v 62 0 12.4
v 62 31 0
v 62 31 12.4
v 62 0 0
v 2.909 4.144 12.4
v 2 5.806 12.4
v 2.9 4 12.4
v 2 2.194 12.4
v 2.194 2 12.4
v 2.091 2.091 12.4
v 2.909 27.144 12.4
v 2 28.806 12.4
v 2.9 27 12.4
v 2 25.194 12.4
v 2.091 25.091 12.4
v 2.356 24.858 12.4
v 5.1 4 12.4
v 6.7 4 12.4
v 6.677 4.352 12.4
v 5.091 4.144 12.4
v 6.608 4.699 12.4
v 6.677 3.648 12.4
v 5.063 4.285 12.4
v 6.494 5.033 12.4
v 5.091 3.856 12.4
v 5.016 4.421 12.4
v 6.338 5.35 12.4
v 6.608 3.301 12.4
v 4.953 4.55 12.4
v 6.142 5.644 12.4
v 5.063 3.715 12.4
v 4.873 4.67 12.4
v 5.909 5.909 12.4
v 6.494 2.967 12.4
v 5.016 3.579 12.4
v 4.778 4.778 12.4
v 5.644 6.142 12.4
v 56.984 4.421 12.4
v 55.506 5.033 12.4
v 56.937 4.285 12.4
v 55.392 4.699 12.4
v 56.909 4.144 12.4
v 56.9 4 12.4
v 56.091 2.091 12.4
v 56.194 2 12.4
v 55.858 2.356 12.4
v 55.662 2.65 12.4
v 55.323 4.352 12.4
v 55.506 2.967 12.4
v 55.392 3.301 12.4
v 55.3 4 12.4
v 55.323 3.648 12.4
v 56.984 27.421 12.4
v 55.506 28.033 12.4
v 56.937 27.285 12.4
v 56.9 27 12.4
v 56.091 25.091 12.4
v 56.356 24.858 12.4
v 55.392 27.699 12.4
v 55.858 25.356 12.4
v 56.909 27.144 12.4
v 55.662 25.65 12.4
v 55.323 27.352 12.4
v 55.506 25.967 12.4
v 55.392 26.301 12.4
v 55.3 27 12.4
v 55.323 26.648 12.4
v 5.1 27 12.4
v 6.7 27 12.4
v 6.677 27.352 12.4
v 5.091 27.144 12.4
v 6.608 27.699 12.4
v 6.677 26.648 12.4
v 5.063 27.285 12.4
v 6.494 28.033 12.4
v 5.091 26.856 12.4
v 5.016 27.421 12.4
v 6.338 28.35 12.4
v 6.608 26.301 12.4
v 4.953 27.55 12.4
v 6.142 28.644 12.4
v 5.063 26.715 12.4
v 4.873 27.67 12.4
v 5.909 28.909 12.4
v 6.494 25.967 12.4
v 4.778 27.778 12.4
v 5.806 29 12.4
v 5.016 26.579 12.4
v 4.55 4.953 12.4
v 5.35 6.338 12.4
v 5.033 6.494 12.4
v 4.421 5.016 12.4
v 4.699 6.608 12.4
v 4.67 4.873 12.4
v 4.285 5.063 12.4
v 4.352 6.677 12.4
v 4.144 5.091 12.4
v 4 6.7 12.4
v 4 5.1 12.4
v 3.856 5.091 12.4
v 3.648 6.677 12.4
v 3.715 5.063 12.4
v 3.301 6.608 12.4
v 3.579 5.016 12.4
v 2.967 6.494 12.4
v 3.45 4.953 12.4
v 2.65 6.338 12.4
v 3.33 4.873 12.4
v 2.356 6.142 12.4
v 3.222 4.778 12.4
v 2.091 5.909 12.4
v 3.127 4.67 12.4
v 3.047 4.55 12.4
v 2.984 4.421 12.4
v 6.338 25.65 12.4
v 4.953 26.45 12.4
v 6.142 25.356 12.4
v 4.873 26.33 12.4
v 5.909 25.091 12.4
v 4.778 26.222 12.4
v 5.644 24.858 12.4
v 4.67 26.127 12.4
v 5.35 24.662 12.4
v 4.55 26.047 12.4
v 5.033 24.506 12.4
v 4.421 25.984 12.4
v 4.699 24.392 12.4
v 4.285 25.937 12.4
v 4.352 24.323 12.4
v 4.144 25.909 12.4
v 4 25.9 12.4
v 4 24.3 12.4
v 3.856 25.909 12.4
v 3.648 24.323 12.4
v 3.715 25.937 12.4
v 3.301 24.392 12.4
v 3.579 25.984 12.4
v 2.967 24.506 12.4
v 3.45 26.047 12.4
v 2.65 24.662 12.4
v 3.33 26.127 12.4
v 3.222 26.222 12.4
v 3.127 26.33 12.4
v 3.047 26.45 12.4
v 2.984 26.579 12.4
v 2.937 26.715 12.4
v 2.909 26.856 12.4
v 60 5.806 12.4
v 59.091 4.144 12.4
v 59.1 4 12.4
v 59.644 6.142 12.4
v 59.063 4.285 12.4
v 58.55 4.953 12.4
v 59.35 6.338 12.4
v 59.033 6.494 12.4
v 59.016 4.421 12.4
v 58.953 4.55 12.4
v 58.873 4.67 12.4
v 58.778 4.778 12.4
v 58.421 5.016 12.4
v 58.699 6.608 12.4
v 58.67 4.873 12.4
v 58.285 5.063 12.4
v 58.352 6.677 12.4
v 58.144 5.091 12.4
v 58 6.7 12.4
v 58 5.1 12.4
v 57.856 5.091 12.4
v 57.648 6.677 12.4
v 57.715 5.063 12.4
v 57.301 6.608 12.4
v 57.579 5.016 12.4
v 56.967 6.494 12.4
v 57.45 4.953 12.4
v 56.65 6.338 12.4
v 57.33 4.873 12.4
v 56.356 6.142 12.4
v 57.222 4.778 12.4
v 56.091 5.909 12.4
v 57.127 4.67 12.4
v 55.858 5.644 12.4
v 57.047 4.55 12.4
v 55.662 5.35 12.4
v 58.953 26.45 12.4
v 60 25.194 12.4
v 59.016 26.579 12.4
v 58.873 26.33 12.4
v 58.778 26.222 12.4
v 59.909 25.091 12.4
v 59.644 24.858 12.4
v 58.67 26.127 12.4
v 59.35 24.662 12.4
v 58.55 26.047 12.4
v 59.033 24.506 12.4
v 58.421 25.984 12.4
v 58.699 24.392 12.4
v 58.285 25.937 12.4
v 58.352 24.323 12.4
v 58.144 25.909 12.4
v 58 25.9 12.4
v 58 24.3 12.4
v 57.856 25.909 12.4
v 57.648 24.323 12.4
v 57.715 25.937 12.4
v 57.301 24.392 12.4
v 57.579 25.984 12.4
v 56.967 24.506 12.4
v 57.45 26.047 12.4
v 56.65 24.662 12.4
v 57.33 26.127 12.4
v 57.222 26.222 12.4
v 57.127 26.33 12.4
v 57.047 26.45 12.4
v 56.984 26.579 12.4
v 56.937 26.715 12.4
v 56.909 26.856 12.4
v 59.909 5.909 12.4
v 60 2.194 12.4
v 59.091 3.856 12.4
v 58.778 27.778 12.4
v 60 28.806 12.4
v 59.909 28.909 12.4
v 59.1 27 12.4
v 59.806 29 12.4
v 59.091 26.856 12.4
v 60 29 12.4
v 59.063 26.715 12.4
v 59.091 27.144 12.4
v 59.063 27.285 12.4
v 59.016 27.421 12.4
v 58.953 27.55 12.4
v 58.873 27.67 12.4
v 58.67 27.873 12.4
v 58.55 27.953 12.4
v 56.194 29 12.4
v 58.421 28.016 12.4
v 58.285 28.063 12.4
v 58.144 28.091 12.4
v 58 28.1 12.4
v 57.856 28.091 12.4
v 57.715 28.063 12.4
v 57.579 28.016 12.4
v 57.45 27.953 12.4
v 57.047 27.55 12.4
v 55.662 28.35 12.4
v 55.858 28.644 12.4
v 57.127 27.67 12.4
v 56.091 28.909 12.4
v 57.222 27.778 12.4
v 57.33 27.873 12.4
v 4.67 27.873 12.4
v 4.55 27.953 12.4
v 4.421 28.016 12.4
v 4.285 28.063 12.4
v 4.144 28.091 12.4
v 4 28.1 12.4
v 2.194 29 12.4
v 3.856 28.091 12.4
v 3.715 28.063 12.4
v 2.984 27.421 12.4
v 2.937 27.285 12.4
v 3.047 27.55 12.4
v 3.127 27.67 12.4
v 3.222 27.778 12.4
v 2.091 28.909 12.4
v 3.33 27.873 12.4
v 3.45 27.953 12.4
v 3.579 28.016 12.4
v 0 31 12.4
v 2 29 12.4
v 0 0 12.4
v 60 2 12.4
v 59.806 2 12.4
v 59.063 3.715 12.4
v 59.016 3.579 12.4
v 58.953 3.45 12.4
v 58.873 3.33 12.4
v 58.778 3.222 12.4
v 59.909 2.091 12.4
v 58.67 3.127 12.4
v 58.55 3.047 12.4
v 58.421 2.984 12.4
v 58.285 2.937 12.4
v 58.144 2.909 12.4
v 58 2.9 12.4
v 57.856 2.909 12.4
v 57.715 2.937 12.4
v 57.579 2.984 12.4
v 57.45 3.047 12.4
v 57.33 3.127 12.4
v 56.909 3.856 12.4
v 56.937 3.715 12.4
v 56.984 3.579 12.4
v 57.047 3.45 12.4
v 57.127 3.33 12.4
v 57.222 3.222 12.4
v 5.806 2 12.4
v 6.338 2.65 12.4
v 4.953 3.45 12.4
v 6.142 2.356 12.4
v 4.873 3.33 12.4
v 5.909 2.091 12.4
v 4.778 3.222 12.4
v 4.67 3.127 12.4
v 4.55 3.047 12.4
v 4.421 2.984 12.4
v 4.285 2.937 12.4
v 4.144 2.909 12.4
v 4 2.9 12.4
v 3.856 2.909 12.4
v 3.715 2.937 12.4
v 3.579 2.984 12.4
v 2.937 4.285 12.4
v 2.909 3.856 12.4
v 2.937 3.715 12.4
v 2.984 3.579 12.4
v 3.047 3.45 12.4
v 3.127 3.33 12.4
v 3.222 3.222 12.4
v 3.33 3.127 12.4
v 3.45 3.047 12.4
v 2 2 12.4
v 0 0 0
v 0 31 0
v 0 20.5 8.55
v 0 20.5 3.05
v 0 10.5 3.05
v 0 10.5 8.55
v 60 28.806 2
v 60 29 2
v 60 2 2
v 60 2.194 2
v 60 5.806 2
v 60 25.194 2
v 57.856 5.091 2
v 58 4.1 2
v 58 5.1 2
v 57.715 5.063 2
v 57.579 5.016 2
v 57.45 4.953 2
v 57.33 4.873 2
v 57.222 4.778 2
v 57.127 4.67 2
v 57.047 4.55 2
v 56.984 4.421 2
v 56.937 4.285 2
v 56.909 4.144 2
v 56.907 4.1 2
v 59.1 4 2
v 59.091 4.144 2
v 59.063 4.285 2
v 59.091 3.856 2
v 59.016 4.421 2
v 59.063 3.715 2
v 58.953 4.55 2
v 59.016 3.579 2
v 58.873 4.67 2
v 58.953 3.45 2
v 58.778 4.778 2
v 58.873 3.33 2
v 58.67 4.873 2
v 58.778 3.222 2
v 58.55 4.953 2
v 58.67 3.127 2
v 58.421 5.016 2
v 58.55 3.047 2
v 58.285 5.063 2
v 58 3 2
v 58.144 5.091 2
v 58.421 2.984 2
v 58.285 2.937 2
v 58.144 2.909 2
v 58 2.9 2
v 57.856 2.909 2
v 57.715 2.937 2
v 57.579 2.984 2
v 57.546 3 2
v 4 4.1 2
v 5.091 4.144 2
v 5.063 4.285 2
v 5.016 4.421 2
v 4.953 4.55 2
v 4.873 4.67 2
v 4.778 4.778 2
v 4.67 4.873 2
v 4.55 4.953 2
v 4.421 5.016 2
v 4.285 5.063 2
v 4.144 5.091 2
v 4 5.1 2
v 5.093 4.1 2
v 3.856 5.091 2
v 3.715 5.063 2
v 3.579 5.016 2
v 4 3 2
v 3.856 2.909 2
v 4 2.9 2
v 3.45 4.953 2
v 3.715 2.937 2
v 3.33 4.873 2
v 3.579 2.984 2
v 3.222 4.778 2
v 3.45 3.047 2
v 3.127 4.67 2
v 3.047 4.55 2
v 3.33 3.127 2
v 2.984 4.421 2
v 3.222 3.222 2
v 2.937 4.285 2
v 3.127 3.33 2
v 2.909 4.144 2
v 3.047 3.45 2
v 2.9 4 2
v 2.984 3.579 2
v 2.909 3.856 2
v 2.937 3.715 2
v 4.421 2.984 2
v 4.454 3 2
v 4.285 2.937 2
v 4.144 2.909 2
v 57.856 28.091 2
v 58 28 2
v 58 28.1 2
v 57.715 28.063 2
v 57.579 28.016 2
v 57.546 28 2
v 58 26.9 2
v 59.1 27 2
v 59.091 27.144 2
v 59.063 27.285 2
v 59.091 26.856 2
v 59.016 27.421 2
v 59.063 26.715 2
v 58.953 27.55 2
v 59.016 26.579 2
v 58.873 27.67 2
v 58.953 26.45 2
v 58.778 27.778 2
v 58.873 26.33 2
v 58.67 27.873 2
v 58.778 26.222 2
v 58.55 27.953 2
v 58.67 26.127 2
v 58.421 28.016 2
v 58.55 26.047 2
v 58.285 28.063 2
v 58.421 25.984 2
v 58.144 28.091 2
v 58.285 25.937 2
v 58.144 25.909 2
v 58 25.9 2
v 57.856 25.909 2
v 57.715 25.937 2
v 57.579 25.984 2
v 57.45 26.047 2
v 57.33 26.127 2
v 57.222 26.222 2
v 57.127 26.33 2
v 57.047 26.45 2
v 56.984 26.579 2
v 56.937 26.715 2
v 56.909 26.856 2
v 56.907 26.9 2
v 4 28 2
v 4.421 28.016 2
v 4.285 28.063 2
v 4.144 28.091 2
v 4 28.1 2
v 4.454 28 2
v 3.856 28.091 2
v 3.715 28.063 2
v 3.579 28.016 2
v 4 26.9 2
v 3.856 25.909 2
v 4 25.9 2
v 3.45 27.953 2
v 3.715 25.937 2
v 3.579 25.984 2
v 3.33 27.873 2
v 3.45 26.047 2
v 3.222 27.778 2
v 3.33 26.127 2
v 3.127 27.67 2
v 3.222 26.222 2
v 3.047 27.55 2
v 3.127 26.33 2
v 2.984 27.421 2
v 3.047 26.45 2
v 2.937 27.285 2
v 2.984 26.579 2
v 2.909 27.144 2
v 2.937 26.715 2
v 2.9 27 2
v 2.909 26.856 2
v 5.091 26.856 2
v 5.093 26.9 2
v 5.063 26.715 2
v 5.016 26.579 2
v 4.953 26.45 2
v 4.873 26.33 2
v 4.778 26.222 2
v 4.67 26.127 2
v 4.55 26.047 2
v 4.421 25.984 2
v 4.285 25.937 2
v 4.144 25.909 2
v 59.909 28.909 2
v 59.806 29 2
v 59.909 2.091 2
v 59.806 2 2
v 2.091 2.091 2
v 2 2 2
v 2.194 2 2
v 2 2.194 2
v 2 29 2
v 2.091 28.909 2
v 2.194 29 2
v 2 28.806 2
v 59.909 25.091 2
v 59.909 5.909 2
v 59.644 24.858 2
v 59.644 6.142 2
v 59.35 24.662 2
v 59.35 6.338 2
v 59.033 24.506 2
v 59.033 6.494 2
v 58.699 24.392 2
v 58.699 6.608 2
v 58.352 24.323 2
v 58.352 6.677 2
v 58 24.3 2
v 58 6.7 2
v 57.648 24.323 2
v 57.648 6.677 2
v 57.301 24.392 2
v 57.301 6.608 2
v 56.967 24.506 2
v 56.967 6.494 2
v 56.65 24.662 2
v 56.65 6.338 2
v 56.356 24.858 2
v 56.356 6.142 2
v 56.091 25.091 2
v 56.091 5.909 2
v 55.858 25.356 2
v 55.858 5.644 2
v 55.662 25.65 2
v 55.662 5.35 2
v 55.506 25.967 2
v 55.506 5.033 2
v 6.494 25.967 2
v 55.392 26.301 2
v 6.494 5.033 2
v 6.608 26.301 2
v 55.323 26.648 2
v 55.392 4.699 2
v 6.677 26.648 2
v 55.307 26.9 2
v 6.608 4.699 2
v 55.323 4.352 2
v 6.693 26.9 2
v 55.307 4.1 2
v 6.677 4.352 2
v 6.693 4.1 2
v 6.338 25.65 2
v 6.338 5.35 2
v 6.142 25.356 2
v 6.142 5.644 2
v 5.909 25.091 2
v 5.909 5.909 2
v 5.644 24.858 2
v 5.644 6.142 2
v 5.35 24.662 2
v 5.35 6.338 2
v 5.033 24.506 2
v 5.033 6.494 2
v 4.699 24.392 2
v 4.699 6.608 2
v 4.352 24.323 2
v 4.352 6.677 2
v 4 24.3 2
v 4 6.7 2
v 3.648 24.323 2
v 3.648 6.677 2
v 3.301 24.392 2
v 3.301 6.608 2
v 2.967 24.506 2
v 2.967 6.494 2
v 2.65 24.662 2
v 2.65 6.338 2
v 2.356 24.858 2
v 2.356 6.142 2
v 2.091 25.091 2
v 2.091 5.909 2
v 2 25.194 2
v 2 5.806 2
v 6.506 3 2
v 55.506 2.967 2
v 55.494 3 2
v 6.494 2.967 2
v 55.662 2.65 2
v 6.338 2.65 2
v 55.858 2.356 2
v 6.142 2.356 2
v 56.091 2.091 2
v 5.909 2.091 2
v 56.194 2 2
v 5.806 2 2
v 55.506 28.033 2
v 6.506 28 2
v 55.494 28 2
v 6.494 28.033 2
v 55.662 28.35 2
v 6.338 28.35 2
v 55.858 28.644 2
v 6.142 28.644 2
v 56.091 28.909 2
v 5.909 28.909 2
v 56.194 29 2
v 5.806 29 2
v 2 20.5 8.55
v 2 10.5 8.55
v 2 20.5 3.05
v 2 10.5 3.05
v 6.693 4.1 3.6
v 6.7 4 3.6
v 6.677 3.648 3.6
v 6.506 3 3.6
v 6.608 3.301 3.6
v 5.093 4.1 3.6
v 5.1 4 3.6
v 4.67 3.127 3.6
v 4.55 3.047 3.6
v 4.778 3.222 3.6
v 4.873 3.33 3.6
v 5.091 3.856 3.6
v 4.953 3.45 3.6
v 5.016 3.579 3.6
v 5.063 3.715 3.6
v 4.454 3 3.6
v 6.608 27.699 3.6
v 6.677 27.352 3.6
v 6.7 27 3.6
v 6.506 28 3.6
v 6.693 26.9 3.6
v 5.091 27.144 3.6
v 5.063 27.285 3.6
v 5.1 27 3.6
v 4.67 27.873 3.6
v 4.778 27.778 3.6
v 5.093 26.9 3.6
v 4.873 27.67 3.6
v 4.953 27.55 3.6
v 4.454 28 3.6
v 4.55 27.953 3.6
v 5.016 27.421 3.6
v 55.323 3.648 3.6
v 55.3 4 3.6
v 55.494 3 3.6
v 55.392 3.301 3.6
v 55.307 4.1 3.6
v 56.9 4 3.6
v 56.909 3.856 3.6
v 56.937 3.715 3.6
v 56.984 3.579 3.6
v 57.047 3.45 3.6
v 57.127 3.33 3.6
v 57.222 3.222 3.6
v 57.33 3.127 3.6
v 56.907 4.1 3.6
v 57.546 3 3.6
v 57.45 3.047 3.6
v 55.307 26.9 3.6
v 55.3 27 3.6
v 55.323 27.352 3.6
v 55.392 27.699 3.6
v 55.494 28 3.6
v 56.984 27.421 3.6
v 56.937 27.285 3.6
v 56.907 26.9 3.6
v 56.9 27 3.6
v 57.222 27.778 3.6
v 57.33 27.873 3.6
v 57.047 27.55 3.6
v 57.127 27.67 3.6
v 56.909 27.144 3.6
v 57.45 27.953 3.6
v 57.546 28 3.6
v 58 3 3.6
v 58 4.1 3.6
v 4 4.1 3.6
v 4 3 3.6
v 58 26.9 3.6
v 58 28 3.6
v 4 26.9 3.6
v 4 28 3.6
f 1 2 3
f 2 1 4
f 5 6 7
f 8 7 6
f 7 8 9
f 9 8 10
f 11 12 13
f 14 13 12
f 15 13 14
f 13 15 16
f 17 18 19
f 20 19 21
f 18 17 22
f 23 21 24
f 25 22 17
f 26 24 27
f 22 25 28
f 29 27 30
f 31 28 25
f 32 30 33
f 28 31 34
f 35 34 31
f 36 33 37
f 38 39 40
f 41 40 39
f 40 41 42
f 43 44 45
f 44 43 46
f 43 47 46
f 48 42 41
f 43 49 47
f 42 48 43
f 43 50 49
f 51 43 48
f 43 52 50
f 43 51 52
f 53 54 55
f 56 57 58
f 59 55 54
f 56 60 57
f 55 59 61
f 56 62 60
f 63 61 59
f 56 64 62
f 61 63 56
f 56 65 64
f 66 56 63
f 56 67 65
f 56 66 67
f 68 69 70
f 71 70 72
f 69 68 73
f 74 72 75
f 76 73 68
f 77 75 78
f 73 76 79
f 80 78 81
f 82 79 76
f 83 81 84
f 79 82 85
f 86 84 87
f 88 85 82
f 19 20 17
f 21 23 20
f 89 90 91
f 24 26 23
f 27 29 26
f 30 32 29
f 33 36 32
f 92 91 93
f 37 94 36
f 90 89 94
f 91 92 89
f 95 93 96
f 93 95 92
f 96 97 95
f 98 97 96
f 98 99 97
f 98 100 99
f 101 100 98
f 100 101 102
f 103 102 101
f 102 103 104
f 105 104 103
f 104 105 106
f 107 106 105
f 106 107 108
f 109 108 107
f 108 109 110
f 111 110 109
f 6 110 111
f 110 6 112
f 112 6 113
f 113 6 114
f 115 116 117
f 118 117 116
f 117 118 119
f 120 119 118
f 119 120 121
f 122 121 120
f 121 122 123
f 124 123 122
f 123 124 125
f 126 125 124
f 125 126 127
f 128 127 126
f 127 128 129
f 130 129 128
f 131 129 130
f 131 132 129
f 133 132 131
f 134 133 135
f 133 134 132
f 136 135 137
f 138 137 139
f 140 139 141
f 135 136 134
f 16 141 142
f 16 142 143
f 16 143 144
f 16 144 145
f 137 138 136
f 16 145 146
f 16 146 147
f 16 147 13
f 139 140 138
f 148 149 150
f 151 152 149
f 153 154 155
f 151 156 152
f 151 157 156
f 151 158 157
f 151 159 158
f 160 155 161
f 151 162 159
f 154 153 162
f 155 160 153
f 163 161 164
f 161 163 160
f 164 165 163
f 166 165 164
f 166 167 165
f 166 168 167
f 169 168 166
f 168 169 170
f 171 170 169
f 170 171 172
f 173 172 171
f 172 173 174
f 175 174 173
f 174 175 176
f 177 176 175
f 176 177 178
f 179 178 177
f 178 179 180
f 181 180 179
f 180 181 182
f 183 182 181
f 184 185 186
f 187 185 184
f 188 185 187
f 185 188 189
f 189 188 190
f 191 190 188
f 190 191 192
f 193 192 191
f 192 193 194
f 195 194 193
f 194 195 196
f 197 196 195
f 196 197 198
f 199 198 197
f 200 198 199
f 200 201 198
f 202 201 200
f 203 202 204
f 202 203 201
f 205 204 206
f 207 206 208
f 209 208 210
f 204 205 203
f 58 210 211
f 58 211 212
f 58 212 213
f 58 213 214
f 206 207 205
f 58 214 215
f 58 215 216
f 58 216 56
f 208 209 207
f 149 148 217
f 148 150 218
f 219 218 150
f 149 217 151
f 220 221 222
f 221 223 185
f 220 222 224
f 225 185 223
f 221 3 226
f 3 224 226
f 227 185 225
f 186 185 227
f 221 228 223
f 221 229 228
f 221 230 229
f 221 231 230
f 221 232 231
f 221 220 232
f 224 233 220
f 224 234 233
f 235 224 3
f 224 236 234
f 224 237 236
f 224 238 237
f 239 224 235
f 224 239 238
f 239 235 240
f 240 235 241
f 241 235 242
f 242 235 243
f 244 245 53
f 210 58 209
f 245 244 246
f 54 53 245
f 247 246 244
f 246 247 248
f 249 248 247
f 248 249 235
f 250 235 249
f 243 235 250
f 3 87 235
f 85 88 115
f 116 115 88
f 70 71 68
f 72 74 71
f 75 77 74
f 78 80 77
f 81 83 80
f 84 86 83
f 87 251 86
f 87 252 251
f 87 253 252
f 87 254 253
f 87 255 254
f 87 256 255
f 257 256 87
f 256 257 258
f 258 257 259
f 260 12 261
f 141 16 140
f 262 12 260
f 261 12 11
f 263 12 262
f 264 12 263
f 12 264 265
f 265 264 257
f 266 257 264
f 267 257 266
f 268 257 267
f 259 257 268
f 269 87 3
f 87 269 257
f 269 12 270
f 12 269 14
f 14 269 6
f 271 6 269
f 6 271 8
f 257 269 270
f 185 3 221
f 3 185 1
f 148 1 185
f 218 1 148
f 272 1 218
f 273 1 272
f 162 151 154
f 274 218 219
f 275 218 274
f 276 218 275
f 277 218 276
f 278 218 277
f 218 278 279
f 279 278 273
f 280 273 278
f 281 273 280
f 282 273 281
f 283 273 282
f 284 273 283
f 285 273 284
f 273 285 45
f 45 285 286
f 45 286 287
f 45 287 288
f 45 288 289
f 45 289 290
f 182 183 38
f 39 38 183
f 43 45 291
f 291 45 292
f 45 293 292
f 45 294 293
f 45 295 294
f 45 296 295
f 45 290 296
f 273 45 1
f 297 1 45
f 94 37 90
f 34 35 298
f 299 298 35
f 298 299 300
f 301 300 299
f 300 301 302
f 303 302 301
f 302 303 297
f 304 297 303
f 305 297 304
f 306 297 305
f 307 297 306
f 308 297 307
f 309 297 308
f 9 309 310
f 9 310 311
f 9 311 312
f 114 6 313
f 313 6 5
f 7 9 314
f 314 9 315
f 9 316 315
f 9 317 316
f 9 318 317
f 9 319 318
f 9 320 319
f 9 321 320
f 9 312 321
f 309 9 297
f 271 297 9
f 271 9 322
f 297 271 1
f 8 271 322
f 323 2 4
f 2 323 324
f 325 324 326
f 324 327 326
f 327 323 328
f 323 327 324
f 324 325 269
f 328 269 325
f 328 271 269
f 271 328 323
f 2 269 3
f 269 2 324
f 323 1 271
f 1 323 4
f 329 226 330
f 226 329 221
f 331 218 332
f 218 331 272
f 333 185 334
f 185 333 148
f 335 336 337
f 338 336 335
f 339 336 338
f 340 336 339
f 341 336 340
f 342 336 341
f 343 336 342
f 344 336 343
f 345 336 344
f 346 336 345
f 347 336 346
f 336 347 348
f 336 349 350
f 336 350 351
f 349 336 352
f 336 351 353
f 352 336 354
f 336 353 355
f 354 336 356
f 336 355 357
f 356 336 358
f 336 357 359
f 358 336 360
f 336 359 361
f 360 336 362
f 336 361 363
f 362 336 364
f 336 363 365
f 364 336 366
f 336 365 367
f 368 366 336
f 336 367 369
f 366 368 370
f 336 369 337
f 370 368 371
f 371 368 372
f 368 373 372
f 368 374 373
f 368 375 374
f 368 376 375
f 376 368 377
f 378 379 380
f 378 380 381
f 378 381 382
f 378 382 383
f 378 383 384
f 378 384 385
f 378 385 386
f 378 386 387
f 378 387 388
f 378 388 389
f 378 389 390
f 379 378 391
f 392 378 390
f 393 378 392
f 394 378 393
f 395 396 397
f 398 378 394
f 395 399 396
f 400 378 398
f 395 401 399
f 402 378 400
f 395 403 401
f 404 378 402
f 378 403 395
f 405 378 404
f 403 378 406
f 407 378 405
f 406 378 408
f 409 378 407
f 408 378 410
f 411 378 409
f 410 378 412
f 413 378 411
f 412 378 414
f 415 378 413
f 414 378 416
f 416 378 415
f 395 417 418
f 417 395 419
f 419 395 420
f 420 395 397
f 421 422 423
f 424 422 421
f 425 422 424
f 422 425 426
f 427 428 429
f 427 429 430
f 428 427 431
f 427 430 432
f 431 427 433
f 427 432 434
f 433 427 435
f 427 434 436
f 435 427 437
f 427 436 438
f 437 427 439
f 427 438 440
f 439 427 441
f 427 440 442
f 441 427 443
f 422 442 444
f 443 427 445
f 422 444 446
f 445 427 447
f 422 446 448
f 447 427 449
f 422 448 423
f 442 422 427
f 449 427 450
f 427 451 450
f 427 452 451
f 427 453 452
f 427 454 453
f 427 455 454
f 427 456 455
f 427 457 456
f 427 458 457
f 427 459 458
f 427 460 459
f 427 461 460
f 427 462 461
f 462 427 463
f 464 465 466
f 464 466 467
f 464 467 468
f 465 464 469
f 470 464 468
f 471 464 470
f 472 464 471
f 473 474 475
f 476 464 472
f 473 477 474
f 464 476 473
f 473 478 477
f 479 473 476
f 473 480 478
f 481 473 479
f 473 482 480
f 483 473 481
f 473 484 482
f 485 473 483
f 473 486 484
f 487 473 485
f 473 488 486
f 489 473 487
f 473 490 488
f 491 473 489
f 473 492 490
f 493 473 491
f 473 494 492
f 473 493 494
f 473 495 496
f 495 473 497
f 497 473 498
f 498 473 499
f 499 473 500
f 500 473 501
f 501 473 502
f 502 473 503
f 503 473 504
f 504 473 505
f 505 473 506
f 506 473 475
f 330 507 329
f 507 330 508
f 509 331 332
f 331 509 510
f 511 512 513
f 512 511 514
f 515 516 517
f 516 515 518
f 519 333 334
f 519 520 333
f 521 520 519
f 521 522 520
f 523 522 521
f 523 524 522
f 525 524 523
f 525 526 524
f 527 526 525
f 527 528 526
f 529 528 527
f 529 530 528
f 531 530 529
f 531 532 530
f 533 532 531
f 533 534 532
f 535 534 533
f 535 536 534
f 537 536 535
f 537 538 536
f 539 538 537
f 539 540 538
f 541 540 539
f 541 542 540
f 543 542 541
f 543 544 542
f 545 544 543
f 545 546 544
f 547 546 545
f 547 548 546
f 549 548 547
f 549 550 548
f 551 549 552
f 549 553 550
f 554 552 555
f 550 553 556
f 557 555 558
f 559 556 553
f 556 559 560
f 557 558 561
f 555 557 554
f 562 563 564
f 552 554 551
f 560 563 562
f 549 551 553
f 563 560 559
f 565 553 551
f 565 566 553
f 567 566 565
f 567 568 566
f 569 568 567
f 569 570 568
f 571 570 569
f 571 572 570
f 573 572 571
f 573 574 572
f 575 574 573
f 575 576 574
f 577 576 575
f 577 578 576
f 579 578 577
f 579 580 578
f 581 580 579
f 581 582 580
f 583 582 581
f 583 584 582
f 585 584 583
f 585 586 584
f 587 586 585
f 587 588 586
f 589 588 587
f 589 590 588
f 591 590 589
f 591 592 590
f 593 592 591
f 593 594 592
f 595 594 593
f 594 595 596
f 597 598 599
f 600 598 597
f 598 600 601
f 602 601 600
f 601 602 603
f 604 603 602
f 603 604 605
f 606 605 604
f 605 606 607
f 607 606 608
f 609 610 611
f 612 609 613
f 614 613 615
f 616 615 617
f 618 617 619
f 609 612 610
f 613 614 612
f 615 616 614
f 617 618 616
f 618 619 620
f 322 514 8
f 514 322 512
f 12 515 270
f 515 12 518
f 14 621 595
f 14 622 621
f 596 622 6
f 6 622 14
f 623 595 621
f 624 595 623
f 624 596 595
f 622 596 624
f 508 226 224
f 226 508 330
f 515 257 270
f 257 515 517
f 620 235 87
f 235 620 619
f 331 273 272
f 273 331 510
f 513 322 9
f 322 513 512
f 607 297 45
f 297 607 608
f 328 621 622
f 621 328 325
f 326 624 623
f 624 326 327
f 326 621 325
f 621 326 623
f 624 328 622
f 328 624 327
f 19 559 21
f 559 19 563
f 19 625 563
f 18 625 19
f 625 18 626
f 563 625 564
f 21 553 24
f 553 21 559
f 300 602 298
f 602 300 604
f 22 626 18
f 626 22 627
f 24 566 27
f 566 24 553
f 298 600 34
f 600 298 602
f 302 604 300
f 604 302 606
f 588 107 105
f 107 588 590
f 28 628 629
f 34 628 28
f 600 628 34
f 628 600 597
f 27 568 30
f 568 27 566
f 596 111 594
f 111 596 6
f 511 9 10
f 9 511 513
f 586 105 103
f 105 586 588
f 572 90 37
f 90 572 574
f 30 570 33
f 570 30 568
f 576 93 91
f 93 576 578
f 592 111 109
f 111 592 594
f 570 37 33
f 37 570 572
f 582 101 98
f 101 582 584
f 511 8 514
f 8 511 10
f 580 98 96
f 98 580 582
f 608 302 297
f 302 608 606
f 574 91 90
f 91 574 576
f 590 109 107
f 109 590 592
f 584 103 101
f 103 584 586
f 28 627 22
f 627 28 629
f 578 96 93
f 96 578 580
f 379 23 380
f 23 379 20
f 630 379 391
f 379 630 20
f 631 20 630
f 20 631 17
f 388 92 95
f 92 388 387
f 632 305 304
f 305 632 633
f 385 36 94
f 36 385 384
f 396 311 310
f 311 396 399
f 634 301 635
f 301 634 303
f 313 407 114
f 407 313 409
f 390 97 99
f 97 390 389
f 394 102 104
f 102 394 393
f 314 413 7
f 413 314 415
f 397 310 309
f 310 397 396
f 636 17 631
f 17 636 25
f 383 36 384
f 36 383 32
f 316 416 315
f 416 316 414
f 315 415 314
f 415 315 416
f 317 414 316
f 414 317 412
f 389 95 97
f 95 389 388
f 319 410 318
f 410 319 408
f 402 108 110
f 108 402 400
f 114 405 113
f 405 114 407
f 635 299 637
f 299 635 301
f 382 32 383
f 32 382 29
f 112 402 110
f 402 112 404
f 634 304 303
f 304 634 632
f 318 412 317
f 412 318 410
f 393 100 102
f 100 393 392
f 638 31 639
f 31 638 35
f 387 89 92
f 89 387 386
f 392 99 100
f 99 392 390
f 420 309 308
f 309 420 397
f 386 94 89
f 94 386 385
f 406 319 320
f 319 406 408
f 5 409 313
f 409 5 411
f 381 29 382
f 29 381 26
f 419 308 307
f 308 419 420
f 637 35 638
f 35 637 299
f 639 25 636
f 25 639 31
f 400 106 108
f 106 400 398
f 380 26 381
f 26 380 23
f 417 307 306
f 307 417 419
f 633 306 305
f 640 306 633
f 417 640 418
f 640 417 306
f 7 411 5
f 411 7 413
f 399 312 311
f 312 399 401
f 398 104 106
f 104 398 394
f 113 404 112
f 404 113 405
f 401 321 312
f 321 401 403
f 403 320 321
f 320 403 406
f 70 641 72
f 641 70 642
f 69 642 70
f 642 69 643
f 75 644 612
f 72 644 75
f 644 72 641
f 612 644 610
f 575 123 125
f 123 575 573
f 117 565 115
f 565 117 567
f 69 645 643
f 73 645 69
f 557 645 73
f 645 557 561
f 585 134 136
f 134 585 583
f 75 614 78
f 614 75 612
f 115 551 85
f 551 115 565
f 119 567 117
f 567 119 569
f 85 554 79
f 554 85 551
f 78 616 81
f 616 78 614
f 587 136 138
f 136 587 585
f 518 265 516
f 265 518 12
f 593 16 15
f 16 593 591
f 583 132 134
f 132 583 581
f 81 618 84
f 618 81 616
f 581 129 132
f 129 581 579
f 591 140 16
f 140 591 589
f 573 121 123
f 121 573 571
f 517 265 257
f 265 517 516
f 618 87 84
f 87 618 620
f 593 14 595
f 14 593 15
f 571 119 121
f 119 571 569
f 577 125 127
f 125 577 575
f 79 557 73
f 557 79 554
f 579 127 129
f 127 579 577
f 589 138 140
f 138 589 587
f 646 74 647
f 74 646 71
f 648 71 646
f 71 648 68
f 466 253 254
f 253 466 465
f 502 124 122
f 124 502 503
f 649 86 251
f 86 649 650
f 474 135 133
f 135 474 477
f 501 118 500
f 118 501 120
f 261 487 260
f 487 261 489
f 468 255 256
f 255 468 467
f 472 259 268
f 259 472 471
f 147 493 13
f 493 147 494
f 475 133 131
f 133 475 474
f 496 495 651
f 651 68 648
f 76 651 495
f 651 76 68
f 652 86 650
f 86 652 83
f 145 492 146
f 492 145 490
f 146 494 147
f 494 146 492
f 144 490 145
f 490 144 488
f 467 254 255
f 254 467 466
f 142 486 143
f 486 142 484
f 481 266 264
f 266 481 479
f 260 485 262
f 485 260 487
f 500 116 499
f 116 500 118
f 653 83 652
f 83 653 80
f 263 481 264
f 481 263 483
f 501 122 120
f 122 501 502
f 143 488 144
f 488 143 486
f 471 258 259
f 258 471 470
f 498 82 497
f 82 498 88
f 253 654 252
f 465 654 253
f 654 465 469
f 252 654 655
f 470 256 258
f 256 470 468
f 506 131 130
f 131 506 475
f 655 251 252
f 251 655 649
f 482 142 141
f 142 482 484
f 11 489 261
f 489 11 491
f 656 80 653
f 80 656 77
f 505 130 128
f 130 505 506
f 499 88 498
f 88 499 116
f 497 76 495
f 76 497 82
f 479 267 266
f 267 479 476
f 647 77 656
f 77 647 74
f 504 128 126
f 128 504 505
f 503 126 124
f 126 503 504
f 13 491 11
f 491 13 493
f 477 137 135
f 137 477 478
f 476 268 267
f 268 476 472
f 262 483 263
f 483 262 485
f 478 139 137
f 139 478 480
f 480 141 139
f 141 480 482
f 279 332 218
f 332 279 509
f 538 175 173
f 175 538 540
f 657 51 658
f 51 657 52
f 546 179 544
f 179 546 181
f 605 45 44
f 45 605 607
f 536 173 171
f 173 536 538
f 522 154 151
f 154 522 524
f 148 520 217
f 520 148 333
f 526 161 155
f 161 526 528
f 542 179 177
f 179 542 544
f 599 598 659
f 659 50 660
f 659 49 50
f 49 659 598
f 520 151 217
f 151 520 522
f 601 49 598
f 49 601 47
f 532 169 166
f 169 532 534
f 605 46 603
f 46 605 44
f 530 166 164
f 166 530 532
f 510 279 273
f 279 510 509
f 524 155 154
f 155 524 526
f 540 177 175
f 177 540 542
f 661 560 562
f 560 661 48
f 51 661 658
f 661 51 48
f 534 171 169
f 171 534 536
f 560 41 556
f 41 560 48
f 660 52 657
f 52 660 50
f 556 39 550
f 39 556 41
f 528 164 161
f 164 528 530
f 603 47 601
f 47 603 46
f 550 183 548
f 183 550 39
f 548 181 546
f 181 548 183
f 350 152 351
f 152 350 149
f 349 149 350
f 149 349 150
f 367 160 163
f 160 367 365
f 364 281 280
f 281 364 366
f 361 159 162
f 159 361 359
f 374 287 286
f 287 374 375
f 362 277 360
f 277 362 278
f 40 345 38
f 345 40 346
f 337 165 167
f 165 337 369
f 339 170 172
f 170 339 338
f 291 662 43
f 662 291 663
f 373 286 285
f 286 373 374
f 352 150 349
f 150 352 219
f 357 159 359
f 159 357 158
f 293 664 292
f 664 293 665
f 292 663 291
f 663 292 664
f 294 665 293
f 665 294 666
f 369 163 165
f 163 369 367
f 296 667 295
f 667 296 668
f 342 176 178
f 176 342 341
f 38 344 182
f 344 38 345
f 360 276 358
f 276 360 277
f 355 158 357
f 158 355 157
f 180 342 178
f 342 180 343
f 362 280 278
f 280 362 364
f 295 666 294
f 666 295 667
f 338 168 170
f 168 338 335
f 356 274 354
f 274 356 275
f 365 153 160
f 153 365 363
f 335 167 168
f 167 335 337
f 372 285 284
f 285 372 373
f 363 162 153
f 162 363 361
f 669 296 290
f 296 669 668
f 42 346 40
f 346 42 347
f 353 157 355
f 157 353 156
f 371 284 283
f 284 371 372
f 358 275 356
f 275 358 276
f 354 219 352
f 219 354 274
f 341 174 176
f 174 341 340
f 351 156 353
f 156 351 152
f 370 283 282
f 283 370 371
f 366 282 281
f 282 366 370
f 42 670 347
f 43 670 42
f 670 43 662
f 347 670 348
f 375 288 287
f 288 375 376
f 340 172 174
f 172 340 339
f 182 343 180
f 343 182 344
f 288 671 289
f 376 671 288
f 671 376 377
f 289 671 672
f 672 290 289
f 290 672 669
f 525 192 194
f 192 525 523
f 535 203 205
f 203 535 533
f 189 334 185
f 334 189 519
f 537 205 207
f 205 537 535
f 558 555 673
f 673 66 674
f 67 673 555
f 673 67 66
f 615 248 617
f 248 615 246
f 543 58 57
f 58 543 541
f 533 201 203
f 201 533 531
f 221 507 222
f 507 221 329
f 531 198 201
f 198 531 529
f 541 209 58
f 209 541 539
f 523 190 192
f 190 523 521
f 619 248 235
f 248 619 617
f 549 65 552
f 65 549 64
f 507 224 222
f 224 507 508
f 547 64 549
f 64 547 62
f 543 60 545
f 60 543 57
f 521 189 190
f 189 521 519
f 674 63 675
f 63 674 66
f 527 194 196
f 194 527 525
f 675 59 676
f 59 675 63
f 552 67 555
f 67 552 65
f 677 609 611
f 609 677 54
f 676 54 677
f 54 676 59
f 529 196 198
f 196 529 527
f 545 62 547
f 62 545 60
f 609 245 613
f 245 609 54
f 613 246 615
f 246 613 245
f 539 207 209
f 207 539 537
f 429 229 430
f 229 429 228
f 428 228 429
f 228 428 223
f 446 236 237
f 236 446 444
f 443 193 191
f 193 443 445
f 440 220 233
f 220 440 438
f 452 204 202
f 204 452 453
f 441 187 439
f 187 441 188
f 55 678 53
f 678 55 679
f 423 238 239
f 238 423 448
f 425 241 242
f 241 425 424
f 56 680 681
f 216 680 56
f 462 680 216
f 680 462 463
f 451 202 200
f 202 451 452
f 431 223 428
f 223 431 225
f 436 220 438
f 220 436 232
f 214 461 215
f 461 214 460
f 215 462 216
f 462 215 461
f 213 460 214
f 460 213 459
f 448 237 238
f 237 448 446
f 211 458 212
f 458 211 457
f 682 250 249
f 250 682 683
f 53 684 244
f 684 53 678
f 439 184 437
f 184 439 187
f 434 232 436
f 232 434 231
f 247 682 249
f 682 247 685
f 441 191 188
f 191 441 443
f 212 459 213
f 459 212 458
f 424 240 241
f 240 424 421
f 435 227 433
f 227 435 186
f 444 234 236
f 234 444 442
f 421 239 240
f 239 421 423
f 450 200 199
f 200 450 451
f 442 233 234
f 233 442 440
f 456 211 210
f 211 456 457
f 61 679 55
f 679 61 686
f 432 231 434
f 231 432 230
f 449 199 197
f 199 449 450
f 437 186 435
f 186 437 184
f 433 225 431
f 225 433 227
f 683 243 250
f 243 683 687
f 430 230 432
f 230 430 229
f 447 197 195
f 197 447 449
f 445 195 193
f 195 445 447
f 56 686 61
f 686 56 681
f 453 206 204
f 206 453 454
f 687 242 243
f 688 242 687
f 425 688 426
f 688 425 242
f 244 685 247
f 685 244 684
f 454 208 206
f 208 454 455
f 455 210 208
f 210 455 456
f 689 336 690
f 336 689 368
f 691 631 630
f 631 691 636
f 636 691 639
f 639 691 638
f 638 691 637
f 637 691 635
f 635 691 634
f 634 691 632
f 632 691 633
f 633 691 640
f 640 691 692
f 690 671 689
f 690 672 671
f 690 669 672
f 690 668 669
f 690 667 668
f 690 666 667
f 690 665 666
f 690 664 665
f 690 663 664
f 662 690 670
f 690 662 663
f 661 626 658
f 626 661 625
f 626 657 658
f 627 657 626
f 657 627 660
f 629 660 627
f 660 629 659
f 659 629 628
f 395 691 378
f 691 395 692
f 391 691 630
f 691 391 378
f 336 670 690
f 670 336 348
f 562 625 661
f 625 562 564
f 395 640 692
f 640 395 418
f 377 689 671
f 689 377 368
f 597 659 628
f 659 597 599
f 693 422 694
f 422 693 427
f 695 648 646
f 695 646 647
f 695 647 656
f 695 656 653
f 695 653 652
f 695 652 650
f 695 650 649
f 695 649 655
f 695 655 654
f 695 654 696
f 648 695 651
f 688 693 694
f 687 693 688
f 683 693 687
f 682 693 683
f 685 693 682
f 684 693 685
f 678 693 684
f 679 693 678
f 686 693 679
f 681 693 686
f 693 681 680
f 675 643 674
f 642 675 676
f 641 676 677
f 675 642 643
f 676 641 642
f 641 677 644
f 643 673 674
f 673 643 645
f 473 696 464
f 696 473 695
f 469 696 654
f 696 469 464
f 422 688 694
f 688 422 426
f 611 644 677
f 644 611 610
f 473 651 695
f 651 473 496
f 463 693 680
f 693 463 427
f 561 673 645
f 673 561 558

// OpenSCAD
// PanicStick enclosure for Raspberry Pi Pico 2 (non-W). All dimensions are mm.
// Set part to "base" or "lid"; render (F6), then File > Export > Export as STL.
part = "base";
$fn = 48;

case_x=62; case_y=31; base_z=12.4; wall=2; floor=2; lid_z=2;
usb_width=10; usb_height=5.5; usb_y=case_y/2; usb_z=5.8;
button_x=39; button_y=case_y/2; button_aperture=9;
led_x=49.5; led_y=case_y/2; led_d=3.4;
screw_x=[4,58]; screw_y=[4,27];

module boss(x,y) {
  translate([x,y,floor]) difference() {
    cylinder(h=base_z-floor,d=5.4);
    translate([0,0,-0.1]) cylinder(h=base_z-floor+0.2,d=2.2);
  }
}
module base() {
  union() {
    difference() {
      cube([case_x,case_y,base_z]);
      translate([wall,wall,floor]) cube([case_x-2*wall,case_y-2*wall,base_z-floor+0.1]);
      // Pico 2 Micro-USB-B connector clearance.
      translate([-0.1,usb_y-usb_width/2,usb_z-usb_height/2]) cube([wall+0.2,usb_width,usb_height]);
    }
    // Low edge rails support the 51 x 21 mm board while leaving pads clear.
    translate([4,3,floor]) cube([54,1.1,1.6]);
    translate([4,26.9,floor]) cube([54,1.1,1.6]);
    for(x=screw_x) for(y=screw_y) boss(x,y);
  }
}
module lid() {
  difference() {
    union() {
      translate([0,0,base_z]) cube([case_x,case_y,lid_z]);
      // Raised square guard protects a small momentary trigger switch.
      translate([button_x-7.2,button_y-7.2,base_z+lid_z]) difference() {
        cube([14.4,14.4,1.8]);
        translate([2.7,2.7,-0.1]) cube([9,9,2]);
      }
    }
    for(x=screw_x) for(y=screw_y) translate([x,y,base_z-0.1]) cylinder(h=lid_z+2.1,d=2.8);
    translate([button_x-button_aperture/2,button_y-button_aperture/2,base_z-0.1]) cube([button_aperture,button_aperture,lid_z+2.1]);
    // Align the light pipe opening to the Pico onboard LED at assembly.
    translate([led_x,led_y,base_z-0.1]) cylinder(h=lid_z+2.1,d=led_d);
  }
}
if(part=="base") base();
if(part=="lid") lid();
